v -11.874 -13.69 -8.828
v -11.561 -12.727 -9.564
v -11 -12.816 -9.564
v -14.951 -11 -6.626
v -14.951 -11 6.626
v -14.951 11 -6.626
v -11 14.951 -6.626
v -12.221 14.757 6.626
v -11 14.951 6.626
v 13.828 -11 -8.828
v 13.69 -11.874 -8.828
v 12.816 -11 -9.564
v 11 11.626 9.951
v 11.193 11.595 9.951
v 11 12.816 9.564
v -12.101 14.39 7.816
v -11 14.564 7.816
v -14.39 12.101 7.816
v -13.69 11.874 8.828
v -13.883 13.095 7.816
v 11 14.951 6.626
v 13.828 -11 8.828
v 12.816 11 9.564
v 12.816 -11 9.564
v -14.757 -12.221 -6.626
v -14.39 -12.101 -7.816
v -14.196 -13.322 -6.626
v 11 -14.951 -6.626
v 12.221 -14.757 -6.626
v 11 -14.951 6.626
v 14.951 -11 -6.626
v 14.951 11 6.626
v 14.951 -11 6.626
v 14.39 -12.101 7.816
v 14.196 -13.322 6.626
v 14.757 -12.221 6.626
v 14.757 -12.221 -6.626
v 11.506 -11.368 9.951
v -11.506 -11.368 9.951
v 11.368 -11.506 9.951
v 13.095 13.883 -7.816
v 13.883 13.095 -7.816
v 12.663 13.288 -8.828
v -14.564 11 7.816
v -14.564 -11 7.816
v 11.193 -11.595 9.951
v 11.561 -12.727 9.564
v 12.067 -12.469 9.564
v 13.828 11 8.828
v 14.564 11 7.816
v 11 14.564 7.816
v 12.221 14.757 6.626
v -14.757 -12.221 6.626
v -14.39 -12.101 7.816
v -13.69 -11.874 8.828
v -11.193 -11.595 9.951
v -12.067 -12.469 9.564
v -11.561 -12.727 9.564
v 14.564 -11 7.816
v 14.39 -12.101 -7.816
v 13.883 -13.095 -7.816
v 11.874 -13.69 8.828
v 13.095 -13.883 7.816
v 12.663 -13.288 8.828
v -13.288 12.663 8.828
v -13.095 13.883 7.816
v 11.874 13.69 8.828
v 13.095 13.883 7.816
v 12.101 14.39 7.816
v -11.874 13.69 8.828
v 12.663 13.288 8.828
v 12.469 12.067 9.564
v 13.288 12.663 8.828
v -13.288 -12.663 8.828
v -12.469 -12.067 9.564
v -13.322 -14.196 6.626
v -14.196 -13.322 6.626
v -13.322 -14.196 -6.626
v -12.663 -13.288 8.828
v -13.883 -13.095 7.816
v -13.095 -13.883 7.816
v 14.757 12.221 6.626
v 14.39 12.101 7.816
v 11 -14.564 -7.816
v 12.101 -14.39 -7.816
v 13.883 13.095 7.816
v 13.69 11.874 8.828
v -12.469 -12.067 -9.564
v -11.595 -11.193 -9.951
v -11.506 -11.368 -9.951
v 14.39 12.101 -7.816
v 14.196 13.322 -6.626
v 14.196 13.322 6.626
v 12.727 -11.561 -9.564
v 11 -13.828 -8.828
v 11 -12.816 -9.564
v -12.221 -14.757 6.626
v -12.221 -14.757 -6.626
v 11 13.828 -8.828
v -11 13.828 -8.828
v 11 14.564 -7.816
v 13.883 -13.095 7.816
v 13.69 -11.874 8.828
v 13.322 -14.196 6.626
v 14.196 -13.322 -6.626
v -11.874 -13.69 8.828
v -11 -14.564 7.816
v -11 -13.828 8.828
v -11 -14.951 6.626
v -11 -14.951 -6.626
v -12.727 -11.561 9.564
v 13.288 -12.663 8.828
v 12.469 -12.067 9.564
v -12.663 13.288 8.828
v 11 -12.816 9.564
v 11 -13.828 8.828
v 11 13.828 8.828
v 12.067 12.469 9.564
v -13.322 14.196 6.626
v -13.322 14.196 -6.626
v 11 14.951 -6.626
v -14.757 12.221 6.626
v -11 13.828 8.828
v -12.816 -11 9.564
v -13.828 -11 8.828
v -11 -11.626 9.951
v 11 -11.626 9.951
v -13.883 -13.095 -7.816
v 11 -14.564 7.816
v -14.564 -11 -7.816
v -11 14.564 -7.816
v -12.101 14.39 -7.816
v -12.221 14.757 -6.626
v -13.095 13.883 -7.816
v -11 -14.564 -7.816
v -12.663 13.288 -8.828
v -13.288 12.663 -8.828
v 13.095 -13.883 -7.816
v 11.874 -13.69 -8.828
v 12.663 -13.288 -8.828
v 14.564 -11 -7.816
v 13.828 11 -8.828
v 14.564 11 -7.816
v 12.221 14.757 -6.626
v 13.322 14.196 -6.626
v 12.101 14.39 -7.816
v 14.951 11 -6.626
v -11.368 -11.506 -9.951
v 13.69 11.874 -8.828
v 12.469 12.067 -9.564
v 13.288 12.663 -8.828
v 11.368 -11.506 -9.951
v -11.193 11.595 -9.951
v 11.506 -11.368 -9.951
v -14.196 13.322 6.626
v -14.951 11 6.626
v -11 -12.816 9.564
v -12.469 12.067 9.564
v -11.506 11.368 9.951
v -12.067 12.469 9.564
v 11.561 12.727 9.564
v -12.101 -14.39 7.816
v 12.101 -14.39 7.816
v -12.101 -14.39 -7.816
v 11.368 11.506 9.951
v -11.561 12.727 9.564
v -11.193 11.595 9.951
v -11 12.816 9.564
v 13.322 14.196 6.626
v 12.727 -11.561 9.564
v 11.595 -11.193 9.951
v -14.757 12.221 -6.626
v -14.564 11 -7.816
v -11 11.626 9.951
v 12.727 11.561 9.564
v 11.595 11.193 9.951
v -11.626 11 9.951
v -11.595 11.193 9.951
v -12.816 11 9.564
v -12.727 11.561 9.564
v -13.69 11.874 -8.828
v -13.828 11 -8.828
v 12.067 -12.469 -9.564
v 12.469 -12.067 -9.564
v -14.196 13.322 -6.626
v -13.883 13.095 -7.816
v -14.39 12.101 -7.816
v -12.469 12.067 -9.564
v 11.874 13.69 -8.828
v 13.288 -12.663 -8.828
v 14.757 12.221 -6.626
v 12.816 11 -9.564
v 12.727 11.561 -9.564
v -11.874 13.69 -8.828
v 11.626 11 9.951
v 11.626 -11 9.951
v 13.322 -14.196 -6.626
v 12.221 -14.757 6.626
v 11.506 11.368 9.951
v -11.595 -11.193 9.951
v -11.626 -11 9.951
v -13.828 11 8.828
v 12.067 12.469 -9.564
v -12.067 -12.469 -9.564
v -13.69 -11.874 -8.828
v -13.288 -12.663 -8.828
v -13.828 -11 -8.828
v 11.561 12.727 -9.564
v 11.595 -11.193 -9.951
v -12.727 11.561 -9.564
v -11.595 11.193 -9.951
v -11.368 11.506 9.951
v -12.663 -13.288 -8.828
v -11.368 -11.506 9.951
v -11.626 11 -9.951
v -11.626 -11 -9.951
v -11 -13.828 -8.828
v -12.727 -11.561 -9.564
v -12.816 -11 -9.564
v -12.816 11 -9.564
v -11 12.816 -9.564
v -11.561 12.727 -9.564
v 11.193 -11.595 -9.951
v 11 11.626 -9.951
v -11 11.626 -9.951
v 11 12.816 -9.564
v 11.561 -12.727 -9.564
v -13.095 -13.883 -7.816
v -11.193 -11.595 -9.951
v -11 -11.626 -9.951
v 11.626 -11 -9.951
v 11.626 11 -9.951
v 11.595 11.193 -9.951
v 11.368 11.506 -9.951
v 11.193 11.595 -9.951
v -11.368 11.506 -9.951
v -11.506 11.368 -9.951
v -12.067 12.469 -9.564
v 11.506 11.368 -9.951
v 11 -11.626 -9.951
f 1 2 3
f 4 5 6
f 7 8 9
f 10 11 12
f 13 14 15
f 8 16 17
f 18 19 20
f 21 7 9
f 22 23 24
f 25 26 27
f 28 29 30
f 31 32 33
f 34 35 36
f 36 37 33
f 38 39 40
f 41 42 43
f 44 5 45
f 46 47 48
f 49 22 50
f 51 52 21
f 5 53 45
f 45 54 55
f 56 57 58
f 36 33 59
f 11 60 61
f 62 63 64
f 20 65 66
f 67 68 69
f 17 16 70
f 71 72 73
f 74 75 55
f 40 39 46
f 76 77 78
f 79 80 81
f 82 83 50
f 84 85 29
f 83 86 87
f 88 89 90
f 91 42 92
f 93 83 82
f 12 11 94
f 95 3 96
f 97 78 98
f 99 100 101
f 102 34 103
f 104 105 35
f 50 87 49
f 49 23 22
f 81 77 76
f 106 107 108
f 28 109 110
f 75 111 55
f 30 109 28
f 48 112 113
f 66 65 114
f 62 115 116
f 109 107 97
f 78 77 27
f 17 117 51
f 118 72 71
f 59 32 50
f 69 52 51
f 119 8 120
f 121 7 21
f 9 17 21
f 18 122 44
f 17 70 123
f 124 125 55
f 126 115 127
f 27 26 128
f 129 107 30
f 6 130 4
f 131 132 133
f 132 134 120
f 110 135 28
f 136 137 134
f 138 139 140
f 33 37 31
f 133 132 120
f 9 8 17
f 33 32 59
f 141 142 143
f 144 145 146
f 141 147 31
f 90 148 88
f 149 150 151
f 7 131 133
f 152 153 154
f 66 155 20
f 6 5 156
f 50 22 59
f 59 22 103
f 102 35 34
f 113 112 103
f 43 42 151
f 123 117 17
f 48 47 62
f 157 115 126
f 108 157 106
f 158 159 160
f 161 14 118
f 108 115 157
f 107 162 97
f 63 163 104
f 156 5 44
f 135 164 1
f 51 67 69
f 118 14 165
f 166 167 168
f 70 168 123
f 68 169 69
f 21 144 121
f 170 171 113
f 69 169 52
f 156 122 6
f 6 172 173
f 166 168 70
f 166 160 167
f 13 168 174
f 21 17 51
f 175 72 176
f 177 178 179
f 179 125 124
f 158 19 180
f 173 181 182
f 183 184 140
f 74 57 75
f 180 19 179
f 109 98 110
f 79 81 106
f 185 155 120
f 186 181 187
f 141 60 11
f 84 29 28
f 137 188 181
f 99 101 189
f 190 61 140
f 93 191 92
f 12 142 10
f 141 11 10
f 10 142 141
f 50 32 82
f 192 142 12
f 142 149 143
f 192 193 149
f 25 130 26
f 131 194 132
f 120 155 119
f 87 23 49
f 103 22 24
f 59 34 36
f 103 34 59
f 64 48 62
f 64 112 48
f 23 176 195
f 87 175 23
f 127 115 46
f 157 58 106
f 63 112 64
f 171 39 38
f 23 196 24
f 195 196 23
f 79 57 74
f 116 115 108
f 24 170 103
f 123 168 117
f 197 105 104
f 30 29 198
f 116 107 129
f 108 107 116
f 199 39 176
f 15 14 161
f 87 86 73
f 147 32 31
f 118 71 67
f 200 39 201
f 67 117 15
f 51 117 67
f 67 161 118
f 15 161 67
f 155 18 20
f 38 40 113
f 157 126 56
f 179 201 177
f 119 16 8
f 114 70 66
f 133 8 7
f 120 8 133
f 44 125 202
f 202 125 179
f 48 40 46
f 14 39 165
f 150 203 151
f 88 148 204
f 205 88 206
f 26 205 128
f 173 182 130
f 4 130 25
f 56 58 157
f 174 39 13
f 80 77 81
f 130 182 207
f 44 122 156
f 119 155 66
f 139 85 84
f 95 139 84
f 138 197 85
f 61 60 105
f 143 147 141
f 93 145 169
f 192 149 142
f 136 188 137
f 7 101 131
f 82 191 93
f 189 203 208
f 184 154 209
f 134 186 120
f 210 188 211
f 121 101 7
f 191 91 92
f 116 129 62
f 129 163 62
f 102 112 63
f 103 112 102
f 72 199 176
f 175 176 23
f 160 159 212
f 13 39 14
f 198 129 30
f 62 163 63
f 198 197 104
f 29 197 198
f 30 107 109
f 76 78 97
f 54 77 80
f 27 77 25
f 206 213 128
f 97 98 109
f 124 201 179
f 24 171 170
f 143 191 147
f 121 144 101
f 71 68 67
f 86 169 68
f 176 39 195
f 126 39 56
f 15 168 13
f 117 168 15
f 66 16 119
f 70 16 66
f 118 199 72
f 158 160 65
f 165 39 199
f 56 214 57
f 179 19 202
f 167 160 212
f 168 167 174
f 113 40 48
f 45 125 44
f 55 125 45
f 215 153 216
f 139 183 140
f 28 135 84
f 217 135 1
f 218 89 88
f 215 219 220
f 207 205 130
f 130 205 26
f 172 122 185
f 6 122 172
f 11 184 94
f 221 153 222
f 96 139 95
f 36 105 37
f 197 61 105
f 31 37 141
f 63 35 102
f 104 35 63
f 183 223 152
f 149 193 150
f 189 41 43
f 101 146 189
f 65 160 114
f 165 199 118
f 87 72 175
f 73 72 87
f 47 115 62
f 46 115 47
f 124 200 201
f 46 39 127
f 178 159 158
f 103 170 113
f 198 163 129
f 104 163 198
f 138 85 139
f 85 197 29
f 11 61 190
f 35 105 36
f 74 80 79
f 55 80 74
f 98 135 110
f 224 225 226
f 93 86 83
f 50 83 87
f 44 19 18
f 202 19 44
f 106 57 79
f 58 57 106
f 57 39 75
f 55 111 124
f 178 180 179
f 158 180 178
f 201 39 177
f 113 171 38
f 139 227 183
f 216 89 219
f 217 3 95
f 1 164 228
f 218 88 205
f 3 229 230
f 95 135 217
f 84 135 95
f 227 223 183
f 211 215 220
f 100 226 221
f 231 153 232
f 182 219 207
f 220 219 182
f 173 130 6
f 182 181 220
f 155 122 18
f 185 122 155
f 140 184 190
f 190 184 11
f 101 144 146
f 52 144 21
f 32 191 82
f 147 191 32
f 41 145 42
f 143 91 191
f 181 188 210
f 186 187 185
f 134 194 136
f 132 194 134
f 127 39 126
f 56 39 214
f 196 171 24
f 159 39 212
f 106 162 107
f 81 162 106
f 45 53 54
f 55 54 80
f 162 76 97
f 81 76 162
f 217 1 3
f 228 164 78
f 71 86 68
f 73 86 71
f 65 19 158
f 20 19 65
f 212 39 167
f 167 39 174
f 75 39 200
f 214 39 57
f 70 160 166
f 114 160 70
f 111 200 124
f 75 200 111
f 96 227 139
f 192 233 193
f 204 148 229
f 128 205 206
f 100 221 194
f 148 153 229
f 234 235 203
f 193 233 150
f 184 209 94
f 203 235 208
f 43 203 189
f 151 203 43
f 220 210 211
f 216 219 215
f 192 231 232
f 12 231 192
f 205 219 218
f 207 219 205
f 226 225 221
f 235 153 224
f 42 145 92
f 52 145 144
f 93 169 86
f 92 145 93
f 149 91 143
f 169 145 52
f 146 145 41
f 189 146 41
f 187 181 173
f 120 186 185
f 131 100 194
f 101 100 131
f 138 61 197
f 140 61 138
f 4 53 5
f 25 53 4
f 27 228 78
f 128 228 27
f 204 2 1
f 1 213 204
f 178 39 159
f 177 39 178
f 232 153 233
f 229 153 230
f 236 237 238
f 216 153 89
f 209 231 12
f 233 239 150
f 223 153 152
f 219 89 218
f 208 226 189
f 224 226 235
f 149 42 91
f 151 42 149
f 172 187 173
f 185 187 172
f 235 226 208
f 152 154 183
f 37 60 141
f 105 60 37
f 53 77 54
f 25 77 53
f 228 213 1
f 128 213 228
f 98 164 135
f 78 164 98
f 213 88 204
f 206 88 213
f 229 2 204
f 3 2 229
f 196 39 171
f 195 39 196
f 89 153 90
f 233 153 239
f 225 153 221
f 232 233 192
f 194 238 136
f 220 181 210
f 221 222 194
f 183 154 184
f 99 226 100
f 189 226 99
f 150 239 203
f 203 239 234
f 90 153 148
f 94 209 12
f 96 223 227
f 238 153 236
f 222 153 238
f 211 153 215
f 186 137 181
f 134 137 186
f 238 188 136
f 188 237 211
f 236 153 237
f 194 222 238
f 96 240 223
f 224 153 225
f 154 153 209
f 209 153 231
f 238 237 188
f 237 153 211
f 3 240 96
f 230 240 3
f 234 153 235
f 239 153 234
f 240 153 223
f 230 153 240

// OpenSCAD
//-- Constantes para acceder a las coordenadas X,Y,Z de los vectores
X = 0;
Y = 1;
Z = 2;

//-- Parámetros del cubo redondeado
r = 4;              //-- Radio de las curvas
A = [30, 30, 20];   //-- Dimensiones del cubo

//-- Calcular las coordenadas en funcion de los parametros del user
a = (A - [2*r, 2*r, 2*r])/2;

//-- Obtener las coordenadas. Es un atajo para no escribir tanto
x = a[X];
y = a[Y];
z = a[Z];

//-- Calcular los vertices del cubo
vertice = [
  [x, y, z],
  [-x, y, z],
  [-x, -y, z],
  [x, -y, z],
  [x, y, -z],
  [-x, y, -z],
  [-x, -y, -z],
  [x, -y, -z],
];

//-- Cubo de comprobacion. Mismas dimensiones pero sin 
//-- redondear. El redondeado debe tener las mismas dimensiones
%cube(A, center = true);

//-- Dibujar el cubo redondeado. Se coloca en cada vertice una
//-- esfera de radio r y se aplica el operador hull
hull() 
  for (pos = vertice)
    translate(pos)
      sphere(r = r, $fn = 20);
      
